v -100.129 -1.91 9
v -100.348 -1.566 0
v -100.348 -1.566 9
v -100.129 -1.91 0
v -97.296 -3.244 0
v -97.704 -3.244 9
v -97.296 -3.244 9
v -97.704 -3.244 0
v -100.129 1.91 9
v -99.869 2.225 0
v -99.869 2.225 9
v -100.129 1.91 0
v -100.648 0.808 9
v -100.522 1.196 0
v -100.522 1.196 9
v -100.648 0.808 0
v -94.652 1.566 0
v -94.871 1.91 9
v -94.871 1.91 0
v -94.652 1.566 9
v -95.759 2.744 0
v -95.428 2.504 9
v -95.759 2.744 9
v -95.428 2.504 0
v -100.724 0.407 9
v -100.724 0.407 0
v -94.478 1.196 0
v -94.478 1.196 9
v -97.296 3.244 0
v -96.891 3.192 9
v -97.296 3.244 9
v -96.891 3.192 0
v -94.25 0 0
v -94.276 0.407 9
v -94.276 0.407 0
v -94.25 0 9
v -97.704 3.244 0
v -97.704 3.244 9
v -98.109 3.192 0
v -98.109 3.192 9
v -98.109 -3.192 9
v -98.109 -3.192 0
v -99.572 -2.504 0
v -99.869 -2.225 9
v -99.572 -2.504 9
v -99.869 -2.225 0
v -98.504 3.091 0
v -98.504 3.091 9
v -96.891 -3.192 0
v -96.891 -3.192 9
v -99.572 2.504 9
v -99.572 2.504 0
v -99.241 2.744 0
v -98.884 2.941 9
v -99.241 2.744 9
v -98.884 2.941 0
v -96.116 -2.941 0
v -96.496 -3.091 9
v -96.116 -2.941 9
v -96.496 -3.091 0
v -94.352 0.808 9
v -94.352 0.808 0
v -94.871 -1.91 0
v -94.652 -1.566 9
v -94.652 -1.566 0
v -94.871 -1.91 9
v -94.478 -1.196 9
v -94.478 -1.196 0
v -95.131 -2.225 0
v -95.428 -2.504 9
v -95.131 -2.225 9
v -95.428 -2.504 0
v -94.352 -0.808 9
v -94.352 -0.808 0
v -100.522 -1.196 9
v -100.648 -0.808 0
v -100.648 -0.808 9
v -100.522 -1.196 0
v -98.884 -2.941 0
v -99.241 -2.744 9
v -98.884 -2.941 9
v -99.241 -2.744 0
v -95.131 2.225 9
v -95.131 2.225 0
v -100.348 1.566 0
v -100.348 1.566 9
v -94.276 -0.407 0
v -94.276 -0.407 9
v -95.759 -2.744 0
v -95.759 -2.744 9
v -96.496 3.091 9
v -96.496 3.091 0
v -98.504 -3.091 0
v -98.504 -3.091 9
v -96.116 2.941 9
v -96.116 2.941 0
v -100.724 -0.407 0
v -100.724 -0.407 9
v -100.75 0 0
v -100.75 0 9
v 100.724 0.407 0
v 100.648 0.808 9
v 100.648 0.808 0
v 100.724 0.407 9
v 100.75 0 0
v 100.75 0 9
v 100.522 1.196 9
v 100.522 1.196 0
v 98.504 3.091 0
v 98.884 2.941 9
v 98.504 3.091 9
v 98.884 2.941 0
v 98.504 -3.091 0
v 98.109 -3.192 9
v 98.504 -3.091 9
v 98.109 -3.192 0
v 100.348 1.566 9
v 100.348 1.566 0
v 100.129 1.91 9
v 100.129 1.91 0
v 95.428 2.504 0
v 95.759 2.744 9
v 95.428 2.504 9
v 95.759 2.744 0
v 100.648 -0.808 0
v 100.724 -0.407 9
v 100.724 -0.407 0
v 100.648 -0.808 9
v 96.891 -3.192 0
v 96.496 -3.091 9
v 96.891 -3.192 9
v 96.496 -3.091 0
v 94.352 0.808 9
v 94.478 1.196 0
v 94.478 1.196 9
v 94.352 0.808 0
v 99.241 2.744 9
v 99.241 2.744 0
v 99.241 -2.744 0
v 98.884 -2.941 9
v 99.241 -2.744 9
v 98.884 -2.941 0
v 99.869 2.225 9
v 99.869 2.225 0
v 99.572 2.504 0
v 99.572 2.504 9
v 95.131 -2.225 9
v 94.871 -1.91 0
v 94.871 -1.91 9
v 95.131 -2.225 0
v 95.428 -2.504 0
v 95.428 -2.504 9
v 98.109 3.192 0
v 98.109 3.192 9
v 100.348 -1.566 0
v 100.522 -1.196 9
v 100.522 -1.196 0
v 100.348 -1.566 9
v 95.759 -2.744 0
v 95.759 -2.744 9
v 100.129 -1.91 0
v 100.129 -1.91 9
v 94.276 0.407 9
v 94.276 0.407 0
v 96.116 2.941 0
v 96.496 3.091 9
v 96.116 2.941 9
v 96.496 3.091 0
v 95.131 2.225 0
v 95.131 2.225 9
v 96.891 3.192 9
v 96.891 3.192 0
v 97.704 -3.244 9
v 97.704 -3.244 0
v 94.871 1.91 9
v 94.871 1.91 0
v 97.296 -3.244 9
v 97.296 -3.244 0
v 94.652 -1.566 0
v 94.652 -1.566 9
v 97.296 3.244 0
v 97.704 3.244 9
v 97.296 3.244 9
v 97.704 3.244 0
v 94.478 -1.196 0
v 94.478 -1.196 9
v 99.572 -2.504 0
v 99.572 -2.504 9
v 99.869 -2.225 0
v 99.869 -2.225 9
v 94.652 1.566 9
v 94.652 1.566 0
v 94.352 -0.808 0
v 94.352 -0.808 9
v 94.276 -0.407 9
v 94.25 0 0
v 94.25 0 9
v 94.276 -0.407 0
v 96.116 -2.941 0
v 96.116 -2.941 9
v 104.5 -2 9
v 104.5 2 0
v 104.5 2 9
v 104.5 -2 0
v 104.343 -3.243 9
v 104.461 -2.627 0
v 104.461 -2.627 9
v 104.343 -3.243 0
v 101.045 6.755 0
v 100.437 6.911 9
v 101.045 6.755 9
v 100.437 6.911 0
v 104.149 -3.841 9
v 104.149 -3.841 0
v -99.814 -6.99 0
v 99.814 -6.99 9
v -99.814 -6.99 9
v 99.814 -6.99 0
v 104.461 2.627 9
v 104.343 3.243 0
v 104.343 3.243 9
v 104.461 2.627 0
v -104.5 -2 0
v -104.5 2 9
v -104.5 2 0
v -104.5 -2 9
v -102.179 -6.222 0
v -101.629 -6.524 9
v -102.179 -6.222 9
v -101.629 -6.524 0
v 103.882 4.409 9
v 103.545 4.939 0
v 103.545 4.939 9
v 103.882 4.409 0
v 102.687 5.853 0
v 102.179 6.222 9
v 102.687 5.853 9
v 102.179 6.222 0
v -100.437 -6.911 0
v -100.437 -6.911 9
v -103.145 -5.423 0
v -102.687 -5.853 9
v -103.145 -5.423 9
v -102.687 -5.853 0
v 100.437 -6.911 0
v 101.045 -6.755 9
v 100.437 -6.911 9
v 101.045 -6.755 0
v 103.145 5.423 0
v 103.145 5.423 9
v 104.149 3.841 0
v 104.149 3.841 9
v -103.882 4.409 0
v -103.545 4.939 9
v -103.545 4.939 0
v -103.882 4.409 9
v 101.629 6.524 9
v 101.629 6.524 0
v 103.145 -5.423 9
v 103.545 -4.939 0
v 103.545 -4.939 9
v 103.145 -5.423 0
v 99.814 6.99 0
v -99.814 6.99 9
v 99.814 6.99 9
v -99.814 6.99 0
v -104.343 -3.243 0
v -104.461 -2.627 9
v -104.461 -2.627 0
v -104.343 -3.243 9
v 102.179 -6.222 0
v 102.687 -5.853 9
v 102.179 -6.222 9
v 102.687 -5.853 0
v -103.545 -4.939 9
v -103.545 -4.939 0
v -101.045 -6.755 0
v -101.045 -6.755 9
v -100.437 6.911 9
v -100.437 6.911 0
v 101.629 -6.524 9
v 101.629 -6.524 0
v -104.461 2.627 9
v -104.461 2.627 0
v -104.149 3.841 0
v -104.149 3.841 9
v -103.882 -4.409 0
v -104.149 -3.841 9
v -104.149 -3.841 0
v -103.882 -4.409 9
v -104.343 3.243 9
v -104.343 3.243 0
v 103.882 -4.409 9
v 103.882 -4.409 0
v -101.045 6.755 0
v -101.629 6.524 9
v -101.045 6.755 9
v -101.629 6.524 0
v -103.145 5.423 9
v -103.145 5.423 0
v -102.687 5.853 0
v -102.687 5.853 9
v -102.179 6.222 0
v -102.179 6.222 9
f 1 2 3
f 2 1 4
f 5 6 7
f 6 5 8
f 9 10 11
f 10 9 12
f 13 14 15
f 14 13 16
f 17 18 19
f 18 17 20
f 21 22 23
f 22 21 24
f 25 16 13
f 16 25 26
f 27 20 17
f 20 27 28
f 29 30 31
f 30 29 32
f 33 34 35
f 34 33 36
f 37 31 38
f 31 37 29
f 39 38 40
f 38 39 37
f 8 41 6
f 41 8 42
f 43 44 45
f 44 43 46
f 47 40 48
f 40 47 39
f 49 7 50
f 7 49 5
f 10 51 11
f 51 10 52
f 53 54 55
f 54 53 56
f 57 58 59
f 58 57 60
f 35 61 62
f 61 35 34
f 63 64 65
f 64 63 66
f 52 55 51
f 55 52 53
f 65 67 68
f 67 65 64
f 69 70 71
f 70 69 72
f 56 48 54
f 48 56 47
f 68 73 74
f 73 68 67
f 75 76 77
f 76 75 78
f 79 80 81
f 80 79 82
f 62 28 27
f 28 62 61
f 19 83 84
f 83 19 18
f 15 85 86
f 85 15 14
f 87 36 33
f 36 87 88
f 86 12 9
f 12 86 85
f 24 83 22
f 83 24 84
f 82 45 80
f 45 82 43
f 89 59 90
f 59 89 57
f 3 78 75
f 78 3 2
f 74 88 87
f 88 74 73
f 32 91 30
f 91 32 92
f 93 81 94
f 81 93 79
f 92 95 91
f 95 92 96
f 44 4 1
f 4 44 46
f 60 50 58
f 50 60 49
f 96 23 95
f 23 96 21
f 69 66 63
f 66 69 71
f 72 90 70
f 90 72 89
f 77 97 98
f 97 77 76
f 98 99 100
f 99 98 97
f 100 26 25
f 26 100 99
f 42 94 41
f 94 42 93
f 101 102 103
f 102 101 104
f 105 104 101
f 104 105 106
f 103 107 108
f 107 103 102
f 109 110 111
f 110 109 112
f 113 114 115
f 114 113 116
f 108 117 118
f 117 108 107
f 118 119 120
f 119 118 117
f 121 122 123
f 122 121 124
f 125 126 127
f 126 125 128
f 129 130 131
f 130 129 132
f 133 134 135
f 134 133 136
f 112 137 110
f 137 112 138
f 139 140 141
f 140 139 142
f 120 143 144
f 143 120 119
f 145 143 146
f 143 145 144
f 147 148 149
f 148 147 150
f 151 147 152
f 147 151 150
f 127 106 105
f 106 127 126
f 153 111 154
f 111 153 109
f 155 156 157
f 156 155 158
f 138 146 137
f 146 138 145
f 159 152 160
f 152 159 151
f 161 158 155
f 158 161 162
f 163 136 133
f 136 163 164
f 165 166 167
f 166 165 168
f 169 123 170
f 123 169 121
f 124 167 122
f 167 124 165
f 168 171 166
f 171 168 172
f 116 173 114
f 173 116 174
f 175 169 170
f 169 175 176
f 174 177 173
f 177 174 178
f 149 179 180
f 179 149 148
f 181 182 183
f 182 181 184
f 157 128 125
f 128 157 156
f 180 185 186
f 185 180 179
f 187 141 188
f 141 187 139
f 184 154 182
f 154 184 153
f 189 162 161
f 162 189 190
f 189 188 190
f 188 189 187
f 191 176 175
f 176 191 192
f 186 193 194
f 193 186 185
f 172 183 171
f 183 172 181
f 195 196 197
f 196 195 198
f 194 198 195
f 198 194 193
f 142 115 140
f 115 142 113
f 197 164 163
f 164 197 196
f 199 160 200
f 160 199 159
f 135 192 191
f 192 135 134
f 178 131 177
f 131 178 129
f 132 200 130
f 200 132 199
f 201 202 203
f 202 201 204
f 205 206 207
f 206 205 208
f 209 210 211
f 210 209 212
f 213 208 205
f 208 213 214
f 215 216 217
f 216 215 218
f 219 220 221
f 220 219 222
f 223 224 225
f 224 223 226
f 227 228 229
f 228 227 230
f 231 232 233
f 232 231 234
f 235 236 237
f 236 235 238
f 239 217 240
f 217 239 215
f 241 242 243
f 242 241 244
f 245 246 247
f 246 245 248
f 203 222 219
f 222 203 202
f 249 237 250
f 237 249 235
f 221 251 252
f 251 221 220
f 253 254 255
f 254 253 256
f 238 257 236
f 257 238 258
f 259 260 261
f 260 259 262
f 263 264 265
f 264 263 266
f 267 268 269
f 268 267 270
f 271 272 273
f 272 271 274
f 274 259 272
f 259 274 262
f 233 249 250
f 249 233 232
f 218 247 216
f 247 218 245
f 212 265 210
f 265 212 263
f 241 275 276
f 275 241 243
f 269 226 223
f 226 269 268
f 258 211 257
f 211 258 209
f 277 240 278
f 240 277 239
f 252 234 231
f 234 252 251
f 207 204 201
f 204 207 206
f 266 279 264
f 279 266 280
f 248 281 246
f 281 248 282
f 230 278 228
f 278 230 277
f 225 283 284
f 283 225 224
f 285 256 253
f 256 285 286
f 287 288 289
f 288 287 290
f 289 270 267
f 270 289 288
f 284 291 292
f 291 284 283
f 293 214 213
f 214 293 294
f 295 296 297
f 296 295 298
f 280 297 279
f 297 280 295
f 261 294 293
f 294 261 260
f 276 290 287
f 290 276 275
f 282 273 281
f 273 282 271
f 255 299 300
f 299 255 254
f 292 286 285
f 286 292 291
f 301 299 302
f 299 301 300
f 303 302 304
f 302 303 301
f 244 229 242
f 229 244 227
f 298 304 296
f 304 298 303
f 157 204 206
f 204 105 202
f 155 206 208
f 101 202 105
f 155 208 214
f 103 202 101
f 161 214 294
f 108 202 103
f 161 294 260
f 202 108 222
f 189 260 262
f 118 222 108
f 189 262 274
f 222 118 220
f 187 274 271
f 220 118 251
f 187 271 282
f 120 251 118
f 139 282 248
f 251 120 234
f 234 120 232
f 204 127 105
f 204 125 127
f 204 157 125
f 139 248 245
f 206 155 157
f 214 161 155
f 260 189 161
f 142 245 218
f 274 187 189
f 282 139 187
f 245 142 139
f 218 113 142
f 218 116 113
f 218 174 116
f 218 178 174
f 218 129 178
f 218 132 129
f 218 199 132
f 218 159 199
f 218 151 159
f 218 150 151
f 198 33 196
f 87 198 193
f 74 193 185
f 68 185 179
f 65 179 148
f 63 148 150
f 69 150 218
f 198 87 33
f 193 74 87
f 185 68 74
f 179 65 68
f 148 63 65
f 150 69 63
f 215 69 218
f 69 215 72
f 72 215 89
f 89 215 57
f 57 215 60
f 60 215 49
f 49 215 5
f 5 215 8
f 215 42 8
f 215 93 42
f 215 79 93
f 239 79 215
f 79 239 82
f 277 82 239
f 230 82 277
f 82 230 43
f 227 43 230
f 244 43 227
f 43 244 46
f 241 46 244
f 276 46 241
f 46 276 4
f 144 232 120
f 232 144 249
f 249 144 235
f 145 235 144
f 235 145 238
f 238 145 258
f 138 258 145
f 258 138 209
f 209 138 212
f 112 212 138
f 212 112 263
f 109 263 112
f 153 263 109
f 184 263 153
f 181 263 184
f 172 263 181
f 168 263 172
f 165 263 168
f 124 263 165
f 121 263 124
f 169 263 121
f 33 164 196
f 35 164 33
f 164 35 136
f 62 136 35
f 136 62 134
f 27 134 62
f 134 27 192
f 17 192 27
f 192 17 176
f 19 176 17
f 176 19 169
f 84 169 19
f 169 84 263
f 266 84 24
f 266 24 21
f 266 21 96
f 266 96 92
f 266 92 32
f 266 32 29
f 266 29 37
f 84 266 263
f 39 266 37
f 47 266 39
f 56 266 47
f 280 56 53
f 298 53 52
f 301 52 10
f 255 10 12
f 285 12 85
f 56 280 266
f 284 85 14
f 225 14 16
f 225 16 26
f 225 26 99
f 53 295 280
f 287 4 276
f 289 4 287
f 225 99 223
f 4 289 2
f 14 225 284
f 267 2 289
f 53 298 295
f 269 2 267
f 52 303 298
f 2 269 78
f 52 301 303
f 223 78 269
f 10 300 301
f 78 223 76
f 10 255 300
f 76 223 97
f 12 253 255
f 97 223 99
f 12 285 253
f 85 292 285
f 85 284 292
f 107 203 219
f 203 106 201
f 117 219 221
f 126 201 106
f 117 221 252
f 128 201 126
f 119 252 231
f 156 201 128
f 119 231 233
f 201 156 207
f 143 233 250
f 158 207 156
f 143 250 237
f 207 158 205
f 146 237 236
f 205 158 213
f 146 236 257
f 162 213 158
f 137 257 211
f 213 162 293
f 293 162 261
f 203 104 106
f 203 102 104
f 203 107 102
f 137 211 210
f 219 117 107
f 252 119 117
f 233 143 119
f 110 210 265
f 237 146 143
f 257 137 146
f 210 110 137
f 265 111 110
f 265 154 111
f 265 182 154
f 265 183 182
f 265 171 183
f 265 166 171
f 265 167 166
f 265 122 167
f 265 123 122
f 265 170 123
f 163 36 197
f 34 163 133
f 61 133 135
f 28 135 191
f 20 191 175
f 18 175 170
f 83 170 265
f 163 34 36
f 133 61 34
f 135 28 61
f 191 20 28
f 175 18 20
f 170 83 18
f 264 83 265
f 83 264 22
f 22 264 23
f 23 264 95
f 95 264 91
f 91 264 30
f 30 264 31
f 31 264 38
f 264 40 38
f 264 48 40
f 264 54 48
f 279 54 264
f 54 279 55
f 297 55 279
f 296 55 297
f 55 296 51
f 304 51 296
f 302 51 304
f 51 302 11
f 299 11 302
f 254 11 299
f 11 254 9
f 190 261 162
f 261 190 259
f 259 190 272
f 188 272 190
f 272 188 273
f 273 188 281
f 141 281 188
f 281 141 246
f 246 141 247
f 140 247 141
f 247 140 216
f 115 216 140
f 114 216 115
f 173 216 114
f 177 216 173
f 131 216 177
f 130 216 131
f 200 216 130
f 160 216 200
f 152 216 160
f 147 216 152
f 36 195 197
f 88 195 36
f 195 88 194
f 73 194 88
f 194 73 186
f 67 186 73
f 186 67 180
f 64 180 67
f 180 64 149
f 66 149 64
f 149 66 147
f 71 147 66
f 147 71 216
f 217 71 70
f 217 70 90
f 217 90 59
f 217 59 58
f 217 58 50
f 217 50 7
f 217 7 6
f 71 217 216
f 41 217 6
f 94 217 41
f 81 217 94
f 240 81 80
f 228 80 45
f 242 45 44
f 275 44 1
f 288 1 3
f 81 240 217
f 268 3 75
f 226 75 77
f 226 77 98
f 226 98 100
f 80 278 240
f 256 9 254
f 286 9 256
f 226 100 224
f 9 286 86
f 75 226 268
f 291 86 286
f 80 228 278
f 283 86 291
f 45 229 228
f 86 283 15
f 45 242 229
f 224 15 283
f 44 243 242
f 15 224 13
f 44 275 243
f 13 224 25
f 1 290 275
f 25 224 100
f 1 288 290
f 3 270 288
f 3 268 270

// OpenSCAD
$fn = 50;


difference() {
	union() {
		hull() {
			translate(v = [-99.5000000000, 2.0000000000, 0]) {
				cylinder(h = 9, r = 5);
			}
			translate(v = [99.5000000000, 2.0000000000, 0]) {
				cylinder(h = 9, r = 5);
			}
			translate(v = [-99.5000000000, -2.0000000000, 0]) {
				cylinder(h = 9, r = 5);
			}
			translate(v = [99.5000000000, -2.0000000000, 0]) {
				cylinder(h = 9, r = 5);
			}
		}
	}
	union() {
		translate(v = [-97.5000000000, 0.0000000000, -100.0000000000]) {
			cylinder(h = 200, r = 3.2500000000);
		}
		translate(v = [-97.5000000000, 0.0000000000, -100.0000000000]) {
			cylinder(h = 200, r = 3.2500000000);
		}
		translate(v = [97.5000000000, 0.0000000000, -100.0000000000]) {
			cylinder(h = 200, r = 3.2500000000);
		}
		translate(v = [97.5000000000, 0.0000000000, -100.0000000000]) {
			cylinder(h = 200, r = 3.2500000000);
		}
	}
}
